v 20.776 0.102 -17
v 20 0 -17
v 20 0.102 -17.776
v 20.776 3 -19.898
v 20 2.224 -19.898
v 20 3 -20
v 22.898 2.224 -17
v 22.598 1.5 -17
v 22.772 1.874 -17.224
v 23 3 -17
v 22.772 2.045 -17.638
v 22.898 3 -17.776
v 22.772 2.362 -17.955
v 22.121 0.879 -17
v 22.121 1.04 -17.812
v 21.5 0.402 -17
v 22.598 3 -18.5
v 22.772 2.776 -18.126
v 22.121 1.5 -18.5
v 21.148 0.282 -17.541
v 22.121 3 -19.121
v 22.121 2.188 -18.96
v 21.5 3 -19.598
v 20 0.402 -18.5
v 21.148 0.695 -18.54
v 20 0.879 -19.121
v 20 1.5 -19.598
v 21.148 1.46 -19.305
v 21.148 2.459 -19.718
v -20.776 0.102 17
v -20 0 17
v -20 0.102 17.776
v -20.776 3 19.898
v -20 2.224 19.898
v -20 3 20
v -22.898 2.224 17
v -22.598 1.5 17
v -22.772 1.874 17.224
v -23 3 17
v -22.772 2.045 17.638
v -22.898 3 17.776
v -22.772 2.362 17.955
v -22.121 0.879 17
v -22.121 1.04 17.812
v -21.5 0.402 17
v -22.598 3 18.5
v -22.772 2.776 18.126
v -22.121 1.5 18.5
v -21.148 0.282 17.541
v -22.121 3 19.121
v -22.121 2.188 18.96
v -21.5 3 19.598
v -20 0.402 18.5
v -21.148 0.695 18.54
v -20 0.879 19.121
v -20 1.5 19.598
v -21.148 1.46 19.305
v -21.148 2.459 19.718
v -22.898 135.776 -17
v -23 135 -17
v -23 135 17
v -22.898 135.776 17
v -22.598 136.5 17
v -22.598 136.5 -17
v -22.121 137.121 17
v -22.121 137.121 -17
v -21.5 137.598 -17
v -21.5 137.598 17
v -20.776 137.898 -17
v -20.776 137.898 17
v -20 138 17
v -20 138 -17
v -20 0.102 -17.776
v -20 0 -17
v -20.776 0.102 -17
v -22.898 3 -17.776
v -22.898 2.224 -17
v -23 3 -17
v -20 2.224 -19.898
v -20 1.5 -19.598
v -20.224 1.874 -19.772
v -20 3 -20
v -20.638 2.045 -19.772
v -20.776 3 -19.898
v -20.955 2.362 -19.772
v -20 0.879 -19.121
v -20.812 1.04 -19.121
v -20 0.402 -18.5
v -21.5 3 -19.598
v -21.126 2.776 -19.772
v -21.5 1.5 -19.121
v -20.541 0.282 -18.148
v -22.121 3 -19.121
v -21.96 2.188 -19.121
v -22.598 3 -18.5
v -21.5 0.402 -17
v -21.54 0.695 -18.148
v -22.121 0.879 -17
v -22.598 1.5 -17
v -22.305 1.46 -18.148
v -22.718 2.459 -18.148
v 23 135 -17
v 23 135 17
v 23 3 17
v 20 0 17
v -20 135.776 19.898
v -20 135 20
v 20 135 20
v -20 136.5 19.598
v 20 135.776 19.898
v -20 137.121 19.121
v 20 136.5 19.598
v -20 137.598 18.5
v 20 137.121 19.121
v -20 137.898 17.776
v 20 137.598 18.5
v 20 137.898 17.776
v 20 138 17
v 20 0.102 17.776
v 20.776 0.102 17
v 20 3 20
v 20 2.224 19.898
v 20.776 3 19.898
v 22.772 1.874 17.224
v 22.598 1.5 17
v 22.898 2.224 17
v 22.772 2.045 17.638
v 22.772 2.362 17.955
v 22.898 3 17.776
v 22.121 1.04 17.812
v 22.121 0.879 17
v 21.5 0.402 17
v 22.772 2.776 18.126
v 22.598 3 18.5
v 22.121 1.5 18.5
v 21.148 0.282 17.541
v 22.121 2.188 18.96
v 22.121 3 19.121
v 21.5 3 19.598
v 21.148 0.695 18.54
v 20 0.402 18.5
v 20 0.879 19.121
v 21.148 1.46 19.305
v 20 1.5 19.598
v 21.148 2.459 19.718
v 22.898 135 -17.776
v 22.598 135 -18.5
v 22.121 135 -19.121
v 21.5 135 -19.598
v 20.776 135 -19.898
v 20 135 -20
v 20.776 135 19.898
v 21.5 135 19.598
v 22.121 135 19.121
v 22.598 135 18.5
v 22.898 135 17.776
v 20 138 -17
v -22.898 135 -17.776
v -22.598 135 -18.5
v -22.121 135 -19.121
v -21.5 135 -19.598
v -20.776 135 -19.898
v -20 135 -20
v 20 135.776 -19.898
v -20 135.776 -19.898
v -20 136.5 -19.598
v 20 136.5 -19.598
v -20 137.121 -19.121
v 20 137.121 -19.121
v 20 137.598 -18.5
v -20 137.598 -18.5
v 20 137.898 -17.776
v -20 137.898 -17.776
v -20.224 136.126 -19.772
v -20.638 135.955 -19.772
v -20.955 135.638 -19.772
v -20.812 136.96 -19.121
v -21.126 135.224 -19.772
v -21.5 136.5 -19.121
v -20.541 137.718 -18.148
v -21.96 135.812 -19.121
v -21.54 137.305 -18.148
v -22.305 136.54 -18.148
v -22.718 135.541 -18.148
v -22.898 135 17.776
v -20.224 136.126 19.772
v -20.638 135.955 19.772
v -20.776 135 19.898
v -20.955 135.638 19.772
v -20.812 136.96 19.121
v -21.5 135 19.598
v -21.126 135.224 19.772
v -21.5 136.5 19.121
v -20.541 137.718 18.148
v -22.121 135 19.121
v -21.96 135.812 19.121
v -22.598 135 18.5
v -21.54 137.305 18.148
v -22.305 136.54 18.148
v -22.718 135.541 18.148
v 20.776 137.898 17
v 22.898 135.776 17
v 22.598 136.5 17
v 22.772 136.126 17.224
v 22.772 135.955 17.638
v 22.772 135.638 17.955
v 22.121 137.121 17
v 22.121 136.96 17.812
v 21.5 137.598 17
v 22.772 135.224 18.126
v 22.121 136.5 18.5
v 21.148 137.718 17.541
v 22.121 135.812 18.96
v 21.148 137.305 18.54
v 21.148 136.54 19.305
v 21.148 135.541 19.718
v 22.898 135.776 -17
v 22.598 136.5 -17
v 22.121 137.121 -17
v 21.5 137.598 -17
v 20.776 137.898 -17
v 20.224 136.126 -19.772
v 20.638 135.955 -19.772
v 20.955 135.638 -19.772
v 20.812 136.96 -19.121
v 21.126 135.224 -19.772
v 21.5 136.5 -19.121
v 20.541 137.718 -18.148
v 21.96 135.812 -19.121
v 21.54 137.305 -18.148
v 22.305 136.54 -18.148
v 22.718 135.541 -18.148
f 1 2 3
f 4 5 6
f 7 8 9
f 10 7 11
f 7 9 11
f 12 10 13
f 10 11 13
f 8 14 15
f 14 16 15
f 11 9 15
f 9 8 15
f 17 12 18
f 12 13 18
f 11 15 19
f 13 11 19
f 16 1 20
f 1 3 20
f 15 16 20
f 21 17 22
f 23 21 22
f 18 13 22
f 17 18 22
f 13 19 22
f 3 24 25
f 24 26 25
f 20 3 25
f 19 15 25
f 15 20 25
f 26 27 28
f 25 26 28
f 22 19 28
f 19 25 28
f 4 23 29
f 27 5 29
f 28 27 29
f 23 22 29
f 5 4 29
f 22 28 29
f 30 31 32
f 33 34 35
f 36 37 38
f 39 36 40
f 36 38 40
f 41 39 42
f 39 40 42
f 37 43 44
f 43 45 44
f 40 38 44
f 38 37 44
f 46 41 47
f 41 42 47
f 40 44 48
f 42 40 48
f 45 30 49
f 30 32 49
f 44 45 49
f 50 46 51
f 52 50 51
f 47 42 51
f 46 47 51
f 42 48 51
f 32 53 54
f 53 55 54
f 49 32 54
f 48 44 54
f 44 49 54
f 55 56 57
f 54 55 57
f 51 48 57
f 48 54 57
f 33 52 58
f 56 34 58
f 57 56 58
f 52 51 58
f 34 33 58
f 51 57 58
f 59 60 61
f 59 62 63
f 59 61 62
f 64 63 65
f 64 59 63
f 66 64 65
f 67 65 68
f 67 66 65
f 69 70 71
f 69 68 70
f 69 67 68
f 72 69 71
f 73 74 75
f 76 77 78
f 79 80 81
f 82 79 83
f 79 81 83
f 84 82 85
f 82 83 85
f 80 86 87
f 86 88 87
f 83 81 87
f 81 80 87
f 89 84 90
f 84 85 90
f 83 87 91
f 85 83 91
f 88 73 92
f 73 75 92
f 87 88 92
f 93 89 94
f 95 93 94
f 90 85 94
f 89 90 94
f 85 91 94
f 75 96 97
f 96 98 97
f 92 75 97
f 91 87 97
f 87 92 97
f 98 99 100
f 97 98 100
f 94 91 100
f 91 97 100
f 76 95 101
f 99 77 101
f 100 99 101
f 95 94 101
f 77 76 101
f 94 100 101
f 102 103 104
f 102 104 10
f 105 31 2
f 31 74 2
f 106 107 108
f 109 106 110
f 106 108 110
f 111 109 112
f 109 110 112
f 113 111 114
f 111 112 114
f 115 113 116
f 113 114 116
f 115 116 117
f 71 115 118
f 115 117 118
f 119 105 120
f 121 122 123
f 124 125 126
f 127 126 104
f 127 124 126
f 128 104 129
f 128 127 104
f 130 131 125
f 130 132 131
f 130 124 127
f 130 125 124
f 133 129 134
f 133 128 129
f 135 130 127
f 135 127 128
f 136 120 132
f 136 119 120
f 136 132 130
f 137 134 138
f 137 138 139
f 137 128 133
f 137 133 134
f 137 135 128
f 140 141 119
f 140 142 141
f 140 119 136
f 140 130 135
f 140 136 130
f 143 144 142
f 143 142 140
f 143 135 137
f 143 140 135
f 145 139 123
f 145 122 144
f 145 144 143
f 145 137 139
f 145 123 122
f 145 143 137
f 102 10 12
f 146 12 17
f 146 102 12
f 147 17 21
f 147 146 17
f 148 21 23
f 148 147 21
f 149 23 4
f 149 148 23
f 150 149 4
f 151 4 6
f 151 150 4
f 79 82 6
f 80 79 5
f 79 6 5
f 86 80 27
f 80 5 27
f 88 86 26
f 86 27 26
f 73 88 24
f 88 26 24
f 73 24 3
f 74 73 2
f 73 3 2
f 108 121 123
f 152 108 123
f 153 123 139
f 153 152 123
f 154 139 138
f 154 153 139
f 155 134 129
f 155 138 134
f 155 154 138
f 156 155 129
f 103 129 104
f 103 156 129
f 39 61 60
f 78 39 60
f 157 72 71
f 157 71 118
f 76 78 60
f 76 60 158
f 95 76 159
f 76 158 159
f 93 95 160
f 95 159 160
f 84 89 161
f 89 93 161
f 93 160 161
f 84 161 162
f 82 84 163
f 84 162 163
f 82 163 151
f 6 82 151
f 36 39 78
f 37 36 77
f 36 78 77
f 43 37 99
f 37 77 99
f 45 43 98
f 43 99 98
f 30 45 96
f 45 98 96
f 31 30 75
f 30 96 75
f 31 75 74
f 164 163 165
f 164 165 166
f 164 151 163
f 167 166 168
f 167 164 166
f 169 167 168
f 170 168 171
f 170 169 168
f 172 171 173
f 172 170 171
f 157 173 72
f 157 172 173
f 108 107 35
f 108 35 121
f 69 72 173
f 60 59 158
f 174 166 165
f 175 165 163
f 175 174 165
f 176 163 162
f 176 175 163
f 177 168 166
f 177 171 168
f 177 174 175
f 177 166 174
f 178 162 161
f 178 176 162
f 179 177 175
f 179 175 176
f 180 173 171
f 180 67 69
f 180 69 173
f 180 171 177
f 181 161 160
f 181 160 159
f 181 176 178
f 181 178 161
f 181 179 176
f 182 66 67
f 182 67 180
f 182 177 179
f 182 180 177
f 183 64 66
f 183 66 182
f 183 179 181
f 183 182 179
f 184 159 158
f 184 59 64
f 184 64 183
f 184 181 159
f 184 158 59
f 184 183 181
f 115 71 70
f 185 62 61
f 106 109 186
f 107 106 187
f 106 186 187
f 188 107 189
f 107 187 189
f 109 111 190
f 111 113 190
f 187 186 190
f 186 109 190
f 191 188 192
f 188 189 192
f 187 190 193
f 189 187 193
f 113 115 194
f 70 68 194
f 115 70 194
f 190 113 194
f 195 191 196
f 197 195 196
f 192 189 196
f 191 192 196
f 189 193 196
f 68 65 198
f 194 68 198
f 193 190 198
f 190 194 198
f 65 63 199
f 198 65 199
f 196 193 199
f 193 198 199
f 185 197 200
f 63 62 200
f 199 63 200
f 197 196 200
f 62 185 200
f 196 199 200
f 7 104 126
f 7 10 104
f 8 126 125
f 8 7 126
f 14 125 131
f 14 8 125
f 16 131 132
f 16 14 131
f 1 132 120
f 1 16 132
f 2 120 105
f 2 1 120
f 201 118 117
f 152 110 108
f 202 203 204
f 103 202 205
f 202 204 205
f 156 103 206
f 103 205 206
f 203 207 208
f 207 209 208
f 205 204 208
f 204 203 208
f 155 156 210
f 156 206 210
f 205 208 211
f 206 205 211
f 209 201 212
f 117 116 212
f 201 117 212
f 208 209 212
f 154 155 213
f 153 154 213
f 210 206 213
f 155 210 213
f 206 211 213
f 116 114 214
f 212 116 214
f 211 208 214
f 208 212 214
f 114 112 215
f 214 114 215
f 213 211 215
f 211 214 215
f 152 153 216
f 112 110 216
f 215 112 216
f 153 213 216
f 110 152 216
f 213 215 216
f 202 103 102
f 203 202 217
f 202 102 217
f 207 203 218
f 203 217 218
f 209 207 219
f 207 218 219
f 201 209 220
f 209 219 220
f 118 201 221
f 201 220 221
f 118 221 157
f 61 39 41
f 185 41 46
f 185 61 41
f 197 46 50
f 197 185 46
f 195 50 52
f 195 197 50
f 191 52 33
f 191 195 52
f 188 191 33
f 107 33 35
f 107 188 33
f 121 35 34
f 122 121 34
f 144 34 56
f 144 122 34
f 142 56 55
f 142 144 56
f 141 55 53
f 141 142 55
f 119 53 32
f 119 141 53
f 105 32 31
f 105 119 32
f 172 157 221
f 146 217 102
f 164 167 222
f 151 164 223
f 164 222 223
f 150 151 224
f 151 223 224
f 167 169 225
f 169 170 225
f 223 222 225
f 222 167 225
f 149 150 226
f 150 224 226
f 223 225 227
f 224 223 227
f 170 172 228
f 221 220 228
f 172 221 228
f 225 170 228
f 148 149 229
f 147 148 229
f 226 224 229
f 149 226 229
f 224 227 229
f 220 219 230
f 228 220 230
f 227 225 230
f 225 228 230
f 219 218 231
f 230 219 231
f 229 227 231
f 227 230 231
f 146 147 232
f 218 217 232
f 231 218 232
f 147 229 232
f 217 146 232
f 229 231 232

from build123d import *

# Parameters (mm, degrees)
SKETCH1_W           = 46
SKETCH1_H           = 40
BOSS_EXTRUDE1_DEPTH = 138
FILLET1_R           = 3


with BuildPart() as part:
    # Sketch1 → Boss-Extrude1 (new body)
    with BuildSketch(Plane(origin=(0, 0, 0), x_dir=(1, 0, 0), z_dir=(0, 1, 0))):
        Rectangle(SKETCH1_W, SKETCH1_H)
    extrude(amount=BOSS_EXTRUDE1_DEPTH)

    # Fillet1
    fillet1_edges = [part.edges().sort_by_distance(p)[0] for p in [
        (-23, 138, 0),
        (0, 138, 20),
        (23, 138, 0),
        (0, 0, 20),
        (-23, 0, 0),
        (0, 0, -20),
        (23, 0, 0),
        (0, 138, -20),
        (23, 69, 20),
        (-23, 69, 20),
        (-23, 69, -20),
        (23, 69, -20),
    ]]
    fillet(fillet1_edges, radius=FILLET1_R)


solid = part.part
